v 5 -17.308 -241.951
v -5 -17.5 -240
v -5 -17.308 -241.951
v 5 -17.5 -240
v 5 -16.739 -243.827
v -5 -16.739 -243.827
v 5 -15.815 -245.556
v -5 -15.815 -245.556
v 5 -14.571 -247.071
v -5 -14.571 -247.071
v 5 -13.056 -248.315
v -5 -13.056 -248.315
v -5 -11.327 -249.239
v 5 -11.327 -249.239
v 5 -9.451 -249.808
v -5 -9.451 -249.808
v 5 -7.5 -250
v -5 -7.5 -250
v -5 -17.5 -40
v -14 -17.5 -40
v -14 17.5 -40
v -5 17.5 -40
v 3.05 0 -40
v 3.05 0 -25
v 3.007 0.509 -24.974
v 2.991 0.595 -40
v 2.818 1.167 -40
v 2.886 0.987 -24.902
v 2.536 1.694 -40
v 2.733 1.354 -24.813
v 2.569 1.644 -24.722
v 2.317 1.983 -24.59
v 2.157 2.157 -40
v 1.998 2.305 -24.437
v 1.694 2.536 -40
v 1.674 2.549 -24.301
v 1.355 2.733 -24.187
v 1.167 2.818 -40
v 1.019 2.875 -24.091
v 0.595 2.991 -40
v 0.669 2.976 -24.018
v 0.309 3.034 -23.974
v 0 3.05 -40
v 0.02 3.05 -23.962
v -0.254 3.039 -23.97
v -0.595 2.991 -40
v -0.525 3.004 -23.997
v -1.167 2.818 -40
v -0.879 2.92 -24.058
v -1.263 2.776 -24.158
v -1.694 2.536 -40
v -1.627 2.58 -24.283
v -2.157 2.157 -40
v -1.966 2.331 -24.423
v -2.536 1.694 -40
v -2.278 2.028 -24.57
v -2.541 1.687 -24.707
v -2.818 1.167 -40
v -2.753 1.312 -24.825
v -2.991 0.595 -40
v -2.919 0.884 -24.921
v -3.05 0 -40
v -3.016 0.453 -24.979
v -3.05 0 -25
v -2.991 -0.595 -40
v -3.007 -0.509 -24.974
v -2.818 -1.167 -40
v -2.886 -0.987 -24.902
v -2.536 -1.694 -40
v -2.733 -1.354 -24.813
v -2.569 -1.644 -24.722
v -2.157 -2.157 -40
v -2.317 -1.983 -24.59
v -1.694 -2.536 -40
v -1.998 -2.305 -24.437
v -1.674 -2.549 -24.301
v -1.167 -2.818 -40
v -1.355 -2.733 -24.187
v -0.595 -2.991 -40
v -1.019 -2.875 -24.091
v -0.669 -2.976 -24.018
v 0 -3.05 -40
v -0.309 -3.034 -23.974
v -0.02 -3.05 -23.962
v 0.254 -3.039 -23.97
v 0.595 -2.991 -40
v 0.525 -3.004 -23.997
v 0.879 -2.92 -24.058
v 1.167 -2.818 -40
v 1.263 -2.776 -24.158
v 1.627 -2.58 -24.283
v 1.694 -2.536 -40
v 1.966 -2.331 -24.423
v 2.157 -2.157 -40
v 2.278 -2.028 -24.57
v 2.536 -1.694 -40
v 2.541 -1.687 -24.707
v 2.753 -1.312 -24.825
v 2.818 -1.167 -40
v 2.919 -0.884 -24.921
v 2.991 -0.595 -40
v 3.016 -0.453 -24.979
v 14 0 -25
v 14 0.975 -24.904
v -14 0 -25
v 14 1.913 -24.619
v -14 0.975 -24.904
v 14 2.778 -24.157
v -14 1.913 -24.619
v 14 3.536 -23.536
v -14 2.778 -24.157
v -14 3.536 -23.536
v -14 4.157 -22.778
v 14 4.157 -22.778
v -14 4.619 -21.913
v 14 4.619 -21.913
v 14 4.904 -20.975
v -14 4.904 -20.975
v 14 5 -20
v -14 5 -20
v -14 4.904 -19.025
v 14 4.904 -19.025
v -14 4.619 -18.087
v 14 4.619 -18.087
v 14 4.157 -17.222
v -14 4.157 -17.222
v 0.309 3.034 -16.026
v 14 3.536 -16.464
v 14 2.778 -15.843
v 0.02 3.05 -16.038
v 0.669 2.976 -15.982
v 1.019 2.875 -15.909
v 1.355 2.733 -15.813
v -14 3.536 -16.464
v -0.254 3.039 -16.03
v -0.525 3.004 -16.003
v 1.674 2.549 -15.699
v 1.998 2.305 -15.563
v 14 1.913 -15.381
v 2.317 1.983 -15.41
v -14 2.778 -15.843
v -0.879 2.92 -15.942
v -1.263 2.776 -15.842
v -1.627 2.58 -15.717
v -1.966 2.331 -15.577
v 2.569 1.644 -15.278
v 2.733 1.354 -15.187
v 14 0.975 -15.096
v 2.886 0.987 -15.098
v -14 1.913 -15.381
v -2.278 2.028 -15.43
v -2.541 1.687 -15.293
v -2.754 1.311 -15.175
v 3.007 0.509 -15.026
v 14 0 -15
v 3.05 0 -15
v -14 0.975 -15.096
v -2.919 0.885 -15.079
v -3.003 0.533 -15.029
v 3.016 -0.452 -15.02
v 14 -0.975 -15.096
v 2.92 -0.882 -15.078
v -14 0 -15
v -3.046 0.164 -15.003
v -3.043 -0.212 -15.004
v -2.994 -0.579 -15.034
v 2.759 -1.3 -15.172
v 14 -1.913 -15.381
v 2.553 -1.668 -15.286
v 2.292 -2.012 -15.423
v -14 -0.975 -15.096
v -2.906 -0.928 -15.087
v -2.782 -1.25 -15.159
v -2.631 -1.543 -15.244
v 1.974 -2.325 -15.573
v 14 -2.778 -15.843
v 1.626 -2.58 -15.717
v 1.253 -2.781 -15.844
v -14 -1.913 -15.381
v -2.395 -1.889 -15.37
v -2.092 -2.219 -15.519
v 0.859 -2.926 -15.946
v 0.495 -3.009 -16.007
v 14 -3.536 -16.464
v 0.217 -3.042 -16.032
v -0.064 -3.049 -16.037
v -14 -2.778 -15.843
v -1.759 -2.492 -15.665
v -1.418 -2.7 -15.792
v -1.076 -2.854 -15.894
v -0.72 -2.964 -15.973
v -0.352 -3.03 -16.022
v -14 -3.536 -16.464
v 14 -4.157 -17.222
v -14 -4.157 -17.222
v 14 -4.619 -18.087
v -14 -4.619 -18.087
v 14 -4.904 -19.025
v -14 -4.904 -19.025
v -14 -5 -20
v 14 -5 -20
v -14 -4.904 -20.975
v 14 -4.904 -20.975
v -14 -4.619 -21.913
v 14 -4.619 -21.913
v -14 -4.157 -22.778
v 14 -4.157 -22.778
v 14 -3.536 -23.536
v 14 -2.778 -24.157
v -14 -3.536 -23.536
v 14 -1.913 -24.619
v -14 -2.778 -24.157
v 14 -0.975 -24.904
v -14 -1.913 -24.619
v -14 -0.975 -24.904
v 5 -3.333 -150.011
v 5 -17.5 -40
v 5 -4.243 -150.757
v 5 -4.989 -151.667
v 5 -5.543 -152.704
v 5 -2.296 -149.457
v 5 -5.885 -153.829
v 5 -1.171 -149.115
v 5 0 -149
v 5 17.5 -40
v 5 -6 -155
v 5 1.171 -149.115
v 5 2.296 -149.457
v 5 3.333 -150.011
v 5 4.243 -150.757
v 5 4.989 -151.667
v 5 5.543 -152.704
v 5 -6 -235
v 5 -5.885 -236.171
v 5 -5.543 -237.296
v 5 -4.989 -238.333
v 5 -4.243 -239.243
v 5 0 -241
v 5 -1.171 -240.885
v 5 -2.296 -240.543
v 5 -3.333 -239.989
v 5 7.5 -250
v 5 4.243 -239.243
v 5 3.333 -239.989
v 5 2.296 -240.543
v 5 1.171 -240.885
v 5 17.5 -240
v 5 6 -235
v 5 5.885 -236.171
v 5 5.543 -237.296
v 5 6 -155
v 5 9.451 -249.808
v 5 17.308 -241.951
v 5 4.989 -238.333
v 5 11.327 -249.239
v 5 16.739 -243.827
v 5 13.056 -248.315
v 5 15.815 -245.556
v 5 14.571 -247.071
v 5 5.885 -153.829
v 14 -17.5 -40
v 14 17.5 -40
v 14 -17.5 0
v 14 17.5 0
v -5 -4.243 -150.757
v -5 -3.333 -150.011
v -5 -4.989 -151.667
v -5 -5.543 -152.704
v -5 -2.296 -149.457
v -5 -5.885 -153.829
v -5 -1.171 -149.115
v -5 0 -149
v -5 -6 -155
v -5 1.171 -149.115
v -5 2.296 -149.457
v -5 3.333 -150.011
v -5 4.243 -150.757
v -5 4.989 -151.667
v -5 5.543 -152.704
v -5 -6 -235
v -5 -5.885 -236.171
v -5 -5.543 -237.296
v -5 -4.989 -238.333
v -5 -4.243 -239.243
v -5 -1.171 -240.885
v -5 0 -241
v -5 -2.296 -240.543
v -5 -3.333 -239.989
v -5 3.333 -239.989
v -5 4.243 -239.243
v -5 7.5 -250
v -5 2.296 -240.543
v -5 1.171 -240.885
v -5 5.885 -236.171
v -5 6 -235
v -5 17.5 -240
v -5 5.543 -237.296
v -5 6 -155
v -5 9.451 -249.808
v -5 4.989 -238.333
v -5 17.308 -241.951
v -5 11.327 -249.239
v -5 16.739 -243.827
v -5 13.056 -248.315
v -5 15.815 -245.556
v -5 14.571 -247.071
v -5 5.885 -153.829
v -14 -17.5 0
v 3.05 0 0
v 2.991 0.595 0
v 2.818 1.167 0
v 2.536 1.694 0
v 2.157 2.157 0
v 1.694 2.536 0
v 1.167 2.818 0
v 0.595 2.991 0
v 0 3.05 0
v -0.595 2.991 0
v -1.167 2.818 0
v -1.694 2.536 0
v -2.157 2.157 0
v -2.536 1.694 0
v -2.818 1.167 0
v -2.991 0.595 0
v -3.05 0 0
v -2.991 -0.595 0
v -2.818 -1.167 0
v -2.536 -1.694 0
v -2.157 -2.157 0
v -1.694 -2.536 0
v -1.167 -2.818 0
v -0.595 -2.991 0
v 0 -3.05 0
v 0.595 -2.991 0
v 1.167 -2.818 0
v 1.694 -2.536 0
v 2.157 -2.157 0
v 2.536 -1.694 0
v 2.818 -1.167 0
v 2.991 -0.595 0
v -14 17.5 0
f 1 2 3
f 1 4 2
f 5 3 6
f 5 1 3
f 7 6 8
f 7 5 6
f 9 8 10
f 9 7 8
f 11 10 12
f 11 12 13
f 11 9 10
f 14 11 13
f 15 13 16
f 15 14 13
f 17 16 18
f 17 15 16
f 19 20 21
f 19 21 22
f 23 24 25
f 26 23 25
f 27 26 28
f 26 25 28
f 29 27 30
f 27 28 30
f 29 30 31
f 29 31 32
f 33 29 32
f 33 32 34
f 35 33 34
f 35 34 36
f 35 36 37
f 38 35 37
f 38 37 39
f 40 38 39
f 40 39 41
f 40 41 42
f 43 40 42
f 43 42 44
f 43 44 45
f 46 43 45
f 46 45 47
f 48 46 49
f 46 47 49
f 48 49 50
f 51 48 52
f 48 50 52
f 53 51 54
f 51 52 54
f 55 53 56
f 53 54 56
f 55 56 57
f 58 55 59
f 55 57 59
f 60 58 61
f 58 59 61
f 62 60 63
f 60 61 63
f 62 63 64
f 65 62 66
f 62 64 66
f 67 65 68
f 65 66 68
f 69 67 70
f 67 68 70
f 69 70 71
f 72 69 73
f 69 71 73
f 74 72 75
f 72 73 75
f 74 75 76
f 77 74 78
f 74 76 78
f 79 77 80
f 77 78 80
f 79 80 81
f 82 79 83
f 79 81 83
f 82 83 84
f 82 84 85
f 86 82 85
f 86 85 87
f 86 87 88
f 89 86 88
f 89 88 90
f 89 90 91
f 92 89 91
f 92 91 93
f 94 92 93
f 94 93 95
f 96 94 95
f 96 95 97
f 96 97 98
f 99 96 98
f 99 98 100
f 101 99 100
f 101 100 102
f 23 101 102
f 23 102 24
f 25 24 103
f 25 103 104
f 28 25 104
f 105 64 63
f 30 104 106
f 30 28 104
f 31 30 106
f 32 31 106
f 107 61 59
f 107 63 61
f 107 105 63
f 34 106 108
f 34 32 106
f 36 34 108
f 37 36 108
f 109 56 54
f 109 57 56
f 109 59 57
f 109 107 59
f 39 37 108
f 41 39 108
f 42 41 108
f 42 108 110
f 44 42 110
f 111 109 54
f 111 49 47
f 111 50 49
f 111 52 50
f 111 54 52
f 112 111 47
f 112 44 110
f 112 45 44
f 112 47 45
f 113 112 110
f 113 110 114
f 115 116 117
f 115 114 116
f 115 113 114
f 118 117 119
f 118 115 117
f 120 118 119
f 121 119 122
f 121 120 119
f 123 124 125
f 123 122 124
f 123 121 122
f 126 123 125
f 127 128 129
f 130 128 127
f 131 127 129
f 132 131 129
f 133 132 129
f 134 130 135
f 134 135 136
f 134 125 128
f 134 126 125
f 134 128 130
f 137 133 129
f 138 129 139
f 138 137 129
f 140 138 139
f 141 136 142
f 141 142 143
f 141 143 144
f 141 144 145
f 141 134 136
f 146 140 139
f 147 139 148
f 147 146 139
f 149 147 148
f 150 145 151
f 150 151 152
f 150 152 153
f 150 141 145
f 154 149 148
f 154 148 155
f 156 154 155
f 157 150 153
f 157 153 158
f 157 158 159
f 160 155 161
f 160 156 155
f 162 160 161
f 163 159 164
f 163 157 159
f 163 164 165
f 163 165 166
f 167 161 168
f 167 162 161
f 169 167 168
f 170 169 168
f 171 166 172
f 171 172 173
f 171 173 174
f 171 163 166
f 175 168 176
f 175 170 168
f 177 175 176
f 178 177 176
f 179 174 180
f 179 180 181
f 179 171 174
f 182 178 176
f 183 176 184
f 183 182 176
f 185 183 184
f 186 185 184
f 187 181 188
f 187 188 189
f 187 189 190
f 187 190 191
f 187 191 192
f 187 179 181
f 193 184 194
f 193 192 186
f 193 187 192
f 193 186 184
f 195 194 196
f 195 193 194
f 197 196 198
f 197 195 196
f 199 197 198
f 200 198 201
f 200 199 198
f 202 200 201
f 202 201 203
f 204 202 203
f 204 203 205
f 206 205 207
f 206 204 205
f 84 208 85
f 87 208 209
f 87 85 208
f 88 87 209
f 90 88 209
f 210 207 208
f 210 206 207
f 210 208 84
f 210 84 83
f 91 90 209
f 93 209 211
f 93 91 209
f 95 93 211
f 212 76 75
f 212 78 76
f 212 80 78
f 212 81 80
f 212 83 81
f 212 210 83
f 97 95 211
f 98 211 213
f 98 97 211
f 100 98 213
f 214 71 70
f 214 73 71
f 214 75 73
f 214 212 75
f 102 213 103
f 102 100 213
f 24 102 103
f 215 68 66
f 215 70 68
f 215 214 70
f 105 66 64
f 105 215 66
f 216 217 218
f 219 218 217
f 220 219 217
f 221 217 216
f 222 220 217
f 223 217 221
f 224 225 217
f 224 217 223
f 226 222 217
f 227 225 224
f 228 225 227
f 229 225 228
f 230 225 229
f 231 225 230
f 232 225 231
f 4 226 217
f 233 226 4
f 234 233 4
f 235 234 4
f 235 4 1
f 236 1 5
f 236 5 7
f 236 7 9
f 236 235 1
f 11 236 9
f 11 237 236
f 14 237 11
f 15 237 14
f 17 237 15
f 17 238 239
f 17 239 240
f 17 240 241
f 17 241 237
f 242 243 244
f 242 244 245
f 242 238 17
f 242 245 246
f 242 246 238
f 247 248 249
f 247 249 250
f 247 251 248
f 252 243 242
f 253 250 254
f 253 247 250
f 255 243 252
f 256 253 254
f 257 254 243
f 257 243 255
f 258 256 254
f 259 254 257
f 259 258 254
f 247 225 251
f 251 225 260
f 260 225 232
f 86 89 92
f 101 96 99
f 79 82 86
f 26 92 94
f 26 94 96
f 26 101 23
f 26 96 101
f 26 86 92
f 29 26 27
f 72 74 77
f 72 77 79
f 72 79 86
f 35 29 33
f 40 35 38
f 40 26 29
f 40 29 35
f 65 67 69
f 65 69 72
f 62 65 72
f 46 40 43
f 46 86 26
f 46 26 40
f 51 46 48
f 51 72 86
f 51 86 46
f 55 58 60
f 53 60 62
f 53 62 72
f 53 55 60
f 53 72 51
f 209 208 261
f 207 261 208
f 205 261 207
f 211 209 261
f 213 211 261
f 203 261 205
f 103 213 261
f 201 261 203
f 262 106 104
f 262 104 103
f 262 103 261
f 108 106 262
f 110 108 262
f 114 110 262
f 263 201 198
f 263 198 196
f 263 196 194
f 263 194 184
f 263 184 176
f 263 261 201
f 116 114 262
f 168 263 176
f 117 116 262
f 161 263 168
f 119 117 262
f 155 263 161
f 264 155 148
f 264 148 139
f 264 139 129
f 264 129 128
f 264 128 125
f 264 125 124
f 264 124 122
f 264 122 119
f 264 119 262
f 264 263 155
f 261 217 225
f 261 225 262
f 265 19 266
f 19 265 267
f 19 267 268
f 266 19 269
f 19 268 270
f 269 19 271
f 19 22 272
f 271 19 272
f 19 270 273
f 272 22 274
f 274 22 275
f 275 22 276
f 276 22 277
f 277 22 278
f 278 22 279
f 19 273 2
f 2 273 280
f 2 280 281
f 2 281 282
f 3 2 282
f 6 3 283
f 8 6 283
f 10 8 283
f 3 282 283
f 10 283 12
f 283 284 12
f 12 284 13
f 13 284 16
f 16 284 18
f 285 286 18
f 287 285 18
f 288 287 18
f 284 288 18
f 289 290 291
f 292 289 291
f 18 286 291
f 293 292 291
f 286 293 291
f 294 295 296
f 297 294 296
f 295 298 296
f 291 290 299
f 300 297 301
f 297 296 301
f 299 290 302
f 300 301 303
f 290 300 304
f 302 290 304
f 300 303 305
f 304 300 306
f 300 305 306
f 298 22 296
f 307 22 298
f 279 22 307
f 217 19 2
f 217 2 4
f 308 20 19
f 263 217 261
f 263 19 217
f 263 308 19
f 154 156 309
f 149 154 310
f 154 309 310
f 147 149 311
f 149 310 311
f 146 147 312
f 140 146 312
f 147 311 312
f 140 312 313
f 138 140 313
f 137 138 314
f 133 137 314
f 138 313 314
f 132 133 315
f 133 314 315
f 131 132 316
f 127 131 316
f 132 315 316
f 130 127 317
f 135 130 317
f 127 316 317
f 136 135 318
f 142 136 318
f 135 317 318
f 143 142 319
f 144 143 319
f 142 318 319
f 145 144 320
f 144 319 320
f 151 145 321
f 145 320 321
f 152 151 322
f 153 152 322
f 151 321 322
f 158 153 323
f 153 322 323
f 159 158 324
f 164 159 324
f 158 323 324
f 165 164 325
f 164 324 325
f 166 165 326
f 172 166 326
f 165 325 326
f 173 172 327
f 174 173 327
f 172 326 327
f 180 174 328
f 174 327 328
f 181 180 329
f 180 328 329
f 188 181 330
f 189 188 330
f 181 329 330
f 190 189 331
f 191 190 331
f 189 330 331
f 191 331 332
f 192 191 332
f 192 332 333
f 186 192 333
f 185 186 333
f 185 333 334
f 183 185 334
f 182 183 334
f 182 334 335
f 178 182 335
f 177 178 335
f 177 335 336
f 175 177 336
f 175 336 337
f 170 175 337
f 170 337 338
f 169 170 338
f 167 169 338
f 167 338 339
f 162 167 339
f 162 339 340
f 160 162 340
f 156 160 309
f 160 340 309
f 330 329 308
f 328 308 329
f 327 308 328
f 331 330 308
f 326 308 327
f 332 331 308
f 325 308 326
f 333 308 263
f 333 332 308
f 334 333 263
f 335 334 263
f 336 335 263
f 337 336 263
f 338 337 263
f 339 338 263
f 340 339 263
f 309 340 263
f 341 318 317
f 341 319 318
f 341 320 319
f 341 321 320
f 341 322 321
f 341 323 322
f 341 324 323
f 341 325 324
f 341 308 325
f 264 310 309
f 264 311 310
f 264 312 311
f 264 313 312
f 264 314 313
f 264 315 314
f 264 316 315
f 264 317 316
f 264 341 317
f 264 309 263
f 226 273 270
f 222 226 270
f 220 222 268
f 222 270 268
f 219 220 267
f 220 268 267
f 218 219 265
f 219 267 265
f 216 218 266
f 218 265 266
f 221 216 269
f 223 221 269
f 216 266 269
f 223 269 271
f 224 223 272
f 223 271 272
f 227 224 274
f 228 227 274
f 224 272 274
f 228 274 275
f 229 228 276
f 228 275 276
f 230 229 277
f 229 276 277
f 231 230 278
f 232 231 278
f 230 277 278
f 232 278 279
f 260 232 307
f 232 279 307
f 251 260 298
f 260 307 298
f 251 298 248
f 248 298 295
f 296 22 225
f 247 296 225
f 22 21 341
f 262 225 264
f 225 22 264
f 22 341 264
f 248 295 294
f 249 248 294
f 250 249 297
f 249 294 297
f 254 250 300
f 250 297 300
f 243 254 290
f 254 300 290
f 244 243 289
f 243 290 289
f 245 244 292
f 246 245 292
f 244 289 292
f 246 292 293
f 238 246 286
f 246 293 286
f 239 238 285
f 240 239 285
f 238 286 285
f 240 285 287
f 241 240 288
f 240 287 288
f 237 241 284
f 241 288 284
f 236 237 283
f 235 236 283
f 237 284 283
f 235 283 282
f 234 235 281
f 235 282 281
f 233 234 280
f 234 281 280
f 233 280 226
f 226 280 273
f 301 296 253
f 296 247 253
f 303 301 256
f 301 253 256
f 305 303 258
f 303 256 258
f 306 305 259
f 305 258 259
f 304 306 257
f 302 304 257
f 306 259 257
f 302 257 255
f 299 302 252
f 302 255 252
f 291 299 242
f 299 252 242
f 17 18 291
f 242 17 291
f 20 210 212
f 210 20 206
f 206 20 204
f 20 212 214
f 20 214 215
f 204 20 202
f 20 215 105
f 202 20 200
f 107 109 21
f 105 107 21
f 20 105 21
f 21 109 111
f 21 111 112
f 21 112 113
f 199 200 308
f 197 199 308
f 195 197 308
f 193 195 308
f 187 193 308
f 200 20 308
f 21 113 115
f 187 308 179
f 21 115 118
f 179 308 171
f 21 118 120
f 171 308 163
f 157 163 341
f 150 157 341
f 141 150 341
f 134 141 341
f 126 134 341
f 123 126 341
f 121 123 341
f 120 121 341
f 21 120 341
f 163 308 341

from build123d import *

# Parameters (mm, degrees)
SKETCH1_W                = 28
SKETCH1_H                = 35
SKETCH1_R                = 3.05
BOSS_EXTRUDE1_DEPTH      = 40
CUT_EXTRUDE1_DEPTH       = 46.85029989
CUT_EXTRUDE1_DEPTH_BACK  = 46.85029989
SKETCH2_R                = 5
BOSS_EXTRUDE2_DEPTH      = 5
BOSS_EXTRUDE2_DEPTH_BACK = 5
SKETCH4_W                = 210
SKETCH4_H                = 35
FILLET1_R                = 10


with BuildPart() as part:
    # Sketch1 → Boss-Extrude1 (new body)
    with BuildSketch(Plane.XY):
        Rectangle(SKETCH1_W, SKETCH1_H)
        Circle(SKETCH1_R, mode=Mode.SUBTRACT)
    extrude(amount=-BOSS_EXTRUDE1_DEPTH)

    # Sketch2 → Cut-Extrude1 (cut, two sides: drawn at the far end of the back side and taken through both)
    with BuildSketch(Plane(origin=(0, 0, 0), x_dir=(0, 0, -1), z_dir=(1, 0, 0)).offset(-CUT_EXTRUDE1_DEPTH_BACK)):
        with Locations((20, 0)):
            Circle(SKETCH2_R)
    extrude(amount=CUT_EXTRUDE1_DEPTH + CUT_EXTRUDE1_DEPTH_BACK, mode=Mode.SUBTRACT)

    # Sketch4 → Boss-Extrude2 (add, two sides: drawn at the far end of the back side and taken through both)
    with BuildSketch(Plane(origin=(0, 0, 0), x_dir=(0, 0, -1), z_dir=(1, 0, 0)).offset(-BOSS_EXTRUDE2_DEPTH_BACK)):
        with Locations((145, 0)):
            Rectangle(SKETCH4_W, SKETCH4_H)
        with BuildLine():
            Line((235, -6), (155, -6))
            ThreePointArc((155, -6), (149, 0), (155, 6))
            Line((155, 6), (235, 6))
            ThreePointArc((235, 6), (241, 0), (235, -6))
        make_face(mode=Mode.SUBTRACT)
    extrude(amount=BOSS_EXTRUDE2_DEPTH + BOSS_EXTRUDE2_DEPTH_BACK)

    # Fillet1
    fillet1_edges = [part.edges().sort_by_distance(p)[0] for p in [
        (0, 17.5, -250),
        (0, -17.5, -250),
    ]]
    fillet(fillet1_edges, radius=FILLET1_R)


solid = part.part
